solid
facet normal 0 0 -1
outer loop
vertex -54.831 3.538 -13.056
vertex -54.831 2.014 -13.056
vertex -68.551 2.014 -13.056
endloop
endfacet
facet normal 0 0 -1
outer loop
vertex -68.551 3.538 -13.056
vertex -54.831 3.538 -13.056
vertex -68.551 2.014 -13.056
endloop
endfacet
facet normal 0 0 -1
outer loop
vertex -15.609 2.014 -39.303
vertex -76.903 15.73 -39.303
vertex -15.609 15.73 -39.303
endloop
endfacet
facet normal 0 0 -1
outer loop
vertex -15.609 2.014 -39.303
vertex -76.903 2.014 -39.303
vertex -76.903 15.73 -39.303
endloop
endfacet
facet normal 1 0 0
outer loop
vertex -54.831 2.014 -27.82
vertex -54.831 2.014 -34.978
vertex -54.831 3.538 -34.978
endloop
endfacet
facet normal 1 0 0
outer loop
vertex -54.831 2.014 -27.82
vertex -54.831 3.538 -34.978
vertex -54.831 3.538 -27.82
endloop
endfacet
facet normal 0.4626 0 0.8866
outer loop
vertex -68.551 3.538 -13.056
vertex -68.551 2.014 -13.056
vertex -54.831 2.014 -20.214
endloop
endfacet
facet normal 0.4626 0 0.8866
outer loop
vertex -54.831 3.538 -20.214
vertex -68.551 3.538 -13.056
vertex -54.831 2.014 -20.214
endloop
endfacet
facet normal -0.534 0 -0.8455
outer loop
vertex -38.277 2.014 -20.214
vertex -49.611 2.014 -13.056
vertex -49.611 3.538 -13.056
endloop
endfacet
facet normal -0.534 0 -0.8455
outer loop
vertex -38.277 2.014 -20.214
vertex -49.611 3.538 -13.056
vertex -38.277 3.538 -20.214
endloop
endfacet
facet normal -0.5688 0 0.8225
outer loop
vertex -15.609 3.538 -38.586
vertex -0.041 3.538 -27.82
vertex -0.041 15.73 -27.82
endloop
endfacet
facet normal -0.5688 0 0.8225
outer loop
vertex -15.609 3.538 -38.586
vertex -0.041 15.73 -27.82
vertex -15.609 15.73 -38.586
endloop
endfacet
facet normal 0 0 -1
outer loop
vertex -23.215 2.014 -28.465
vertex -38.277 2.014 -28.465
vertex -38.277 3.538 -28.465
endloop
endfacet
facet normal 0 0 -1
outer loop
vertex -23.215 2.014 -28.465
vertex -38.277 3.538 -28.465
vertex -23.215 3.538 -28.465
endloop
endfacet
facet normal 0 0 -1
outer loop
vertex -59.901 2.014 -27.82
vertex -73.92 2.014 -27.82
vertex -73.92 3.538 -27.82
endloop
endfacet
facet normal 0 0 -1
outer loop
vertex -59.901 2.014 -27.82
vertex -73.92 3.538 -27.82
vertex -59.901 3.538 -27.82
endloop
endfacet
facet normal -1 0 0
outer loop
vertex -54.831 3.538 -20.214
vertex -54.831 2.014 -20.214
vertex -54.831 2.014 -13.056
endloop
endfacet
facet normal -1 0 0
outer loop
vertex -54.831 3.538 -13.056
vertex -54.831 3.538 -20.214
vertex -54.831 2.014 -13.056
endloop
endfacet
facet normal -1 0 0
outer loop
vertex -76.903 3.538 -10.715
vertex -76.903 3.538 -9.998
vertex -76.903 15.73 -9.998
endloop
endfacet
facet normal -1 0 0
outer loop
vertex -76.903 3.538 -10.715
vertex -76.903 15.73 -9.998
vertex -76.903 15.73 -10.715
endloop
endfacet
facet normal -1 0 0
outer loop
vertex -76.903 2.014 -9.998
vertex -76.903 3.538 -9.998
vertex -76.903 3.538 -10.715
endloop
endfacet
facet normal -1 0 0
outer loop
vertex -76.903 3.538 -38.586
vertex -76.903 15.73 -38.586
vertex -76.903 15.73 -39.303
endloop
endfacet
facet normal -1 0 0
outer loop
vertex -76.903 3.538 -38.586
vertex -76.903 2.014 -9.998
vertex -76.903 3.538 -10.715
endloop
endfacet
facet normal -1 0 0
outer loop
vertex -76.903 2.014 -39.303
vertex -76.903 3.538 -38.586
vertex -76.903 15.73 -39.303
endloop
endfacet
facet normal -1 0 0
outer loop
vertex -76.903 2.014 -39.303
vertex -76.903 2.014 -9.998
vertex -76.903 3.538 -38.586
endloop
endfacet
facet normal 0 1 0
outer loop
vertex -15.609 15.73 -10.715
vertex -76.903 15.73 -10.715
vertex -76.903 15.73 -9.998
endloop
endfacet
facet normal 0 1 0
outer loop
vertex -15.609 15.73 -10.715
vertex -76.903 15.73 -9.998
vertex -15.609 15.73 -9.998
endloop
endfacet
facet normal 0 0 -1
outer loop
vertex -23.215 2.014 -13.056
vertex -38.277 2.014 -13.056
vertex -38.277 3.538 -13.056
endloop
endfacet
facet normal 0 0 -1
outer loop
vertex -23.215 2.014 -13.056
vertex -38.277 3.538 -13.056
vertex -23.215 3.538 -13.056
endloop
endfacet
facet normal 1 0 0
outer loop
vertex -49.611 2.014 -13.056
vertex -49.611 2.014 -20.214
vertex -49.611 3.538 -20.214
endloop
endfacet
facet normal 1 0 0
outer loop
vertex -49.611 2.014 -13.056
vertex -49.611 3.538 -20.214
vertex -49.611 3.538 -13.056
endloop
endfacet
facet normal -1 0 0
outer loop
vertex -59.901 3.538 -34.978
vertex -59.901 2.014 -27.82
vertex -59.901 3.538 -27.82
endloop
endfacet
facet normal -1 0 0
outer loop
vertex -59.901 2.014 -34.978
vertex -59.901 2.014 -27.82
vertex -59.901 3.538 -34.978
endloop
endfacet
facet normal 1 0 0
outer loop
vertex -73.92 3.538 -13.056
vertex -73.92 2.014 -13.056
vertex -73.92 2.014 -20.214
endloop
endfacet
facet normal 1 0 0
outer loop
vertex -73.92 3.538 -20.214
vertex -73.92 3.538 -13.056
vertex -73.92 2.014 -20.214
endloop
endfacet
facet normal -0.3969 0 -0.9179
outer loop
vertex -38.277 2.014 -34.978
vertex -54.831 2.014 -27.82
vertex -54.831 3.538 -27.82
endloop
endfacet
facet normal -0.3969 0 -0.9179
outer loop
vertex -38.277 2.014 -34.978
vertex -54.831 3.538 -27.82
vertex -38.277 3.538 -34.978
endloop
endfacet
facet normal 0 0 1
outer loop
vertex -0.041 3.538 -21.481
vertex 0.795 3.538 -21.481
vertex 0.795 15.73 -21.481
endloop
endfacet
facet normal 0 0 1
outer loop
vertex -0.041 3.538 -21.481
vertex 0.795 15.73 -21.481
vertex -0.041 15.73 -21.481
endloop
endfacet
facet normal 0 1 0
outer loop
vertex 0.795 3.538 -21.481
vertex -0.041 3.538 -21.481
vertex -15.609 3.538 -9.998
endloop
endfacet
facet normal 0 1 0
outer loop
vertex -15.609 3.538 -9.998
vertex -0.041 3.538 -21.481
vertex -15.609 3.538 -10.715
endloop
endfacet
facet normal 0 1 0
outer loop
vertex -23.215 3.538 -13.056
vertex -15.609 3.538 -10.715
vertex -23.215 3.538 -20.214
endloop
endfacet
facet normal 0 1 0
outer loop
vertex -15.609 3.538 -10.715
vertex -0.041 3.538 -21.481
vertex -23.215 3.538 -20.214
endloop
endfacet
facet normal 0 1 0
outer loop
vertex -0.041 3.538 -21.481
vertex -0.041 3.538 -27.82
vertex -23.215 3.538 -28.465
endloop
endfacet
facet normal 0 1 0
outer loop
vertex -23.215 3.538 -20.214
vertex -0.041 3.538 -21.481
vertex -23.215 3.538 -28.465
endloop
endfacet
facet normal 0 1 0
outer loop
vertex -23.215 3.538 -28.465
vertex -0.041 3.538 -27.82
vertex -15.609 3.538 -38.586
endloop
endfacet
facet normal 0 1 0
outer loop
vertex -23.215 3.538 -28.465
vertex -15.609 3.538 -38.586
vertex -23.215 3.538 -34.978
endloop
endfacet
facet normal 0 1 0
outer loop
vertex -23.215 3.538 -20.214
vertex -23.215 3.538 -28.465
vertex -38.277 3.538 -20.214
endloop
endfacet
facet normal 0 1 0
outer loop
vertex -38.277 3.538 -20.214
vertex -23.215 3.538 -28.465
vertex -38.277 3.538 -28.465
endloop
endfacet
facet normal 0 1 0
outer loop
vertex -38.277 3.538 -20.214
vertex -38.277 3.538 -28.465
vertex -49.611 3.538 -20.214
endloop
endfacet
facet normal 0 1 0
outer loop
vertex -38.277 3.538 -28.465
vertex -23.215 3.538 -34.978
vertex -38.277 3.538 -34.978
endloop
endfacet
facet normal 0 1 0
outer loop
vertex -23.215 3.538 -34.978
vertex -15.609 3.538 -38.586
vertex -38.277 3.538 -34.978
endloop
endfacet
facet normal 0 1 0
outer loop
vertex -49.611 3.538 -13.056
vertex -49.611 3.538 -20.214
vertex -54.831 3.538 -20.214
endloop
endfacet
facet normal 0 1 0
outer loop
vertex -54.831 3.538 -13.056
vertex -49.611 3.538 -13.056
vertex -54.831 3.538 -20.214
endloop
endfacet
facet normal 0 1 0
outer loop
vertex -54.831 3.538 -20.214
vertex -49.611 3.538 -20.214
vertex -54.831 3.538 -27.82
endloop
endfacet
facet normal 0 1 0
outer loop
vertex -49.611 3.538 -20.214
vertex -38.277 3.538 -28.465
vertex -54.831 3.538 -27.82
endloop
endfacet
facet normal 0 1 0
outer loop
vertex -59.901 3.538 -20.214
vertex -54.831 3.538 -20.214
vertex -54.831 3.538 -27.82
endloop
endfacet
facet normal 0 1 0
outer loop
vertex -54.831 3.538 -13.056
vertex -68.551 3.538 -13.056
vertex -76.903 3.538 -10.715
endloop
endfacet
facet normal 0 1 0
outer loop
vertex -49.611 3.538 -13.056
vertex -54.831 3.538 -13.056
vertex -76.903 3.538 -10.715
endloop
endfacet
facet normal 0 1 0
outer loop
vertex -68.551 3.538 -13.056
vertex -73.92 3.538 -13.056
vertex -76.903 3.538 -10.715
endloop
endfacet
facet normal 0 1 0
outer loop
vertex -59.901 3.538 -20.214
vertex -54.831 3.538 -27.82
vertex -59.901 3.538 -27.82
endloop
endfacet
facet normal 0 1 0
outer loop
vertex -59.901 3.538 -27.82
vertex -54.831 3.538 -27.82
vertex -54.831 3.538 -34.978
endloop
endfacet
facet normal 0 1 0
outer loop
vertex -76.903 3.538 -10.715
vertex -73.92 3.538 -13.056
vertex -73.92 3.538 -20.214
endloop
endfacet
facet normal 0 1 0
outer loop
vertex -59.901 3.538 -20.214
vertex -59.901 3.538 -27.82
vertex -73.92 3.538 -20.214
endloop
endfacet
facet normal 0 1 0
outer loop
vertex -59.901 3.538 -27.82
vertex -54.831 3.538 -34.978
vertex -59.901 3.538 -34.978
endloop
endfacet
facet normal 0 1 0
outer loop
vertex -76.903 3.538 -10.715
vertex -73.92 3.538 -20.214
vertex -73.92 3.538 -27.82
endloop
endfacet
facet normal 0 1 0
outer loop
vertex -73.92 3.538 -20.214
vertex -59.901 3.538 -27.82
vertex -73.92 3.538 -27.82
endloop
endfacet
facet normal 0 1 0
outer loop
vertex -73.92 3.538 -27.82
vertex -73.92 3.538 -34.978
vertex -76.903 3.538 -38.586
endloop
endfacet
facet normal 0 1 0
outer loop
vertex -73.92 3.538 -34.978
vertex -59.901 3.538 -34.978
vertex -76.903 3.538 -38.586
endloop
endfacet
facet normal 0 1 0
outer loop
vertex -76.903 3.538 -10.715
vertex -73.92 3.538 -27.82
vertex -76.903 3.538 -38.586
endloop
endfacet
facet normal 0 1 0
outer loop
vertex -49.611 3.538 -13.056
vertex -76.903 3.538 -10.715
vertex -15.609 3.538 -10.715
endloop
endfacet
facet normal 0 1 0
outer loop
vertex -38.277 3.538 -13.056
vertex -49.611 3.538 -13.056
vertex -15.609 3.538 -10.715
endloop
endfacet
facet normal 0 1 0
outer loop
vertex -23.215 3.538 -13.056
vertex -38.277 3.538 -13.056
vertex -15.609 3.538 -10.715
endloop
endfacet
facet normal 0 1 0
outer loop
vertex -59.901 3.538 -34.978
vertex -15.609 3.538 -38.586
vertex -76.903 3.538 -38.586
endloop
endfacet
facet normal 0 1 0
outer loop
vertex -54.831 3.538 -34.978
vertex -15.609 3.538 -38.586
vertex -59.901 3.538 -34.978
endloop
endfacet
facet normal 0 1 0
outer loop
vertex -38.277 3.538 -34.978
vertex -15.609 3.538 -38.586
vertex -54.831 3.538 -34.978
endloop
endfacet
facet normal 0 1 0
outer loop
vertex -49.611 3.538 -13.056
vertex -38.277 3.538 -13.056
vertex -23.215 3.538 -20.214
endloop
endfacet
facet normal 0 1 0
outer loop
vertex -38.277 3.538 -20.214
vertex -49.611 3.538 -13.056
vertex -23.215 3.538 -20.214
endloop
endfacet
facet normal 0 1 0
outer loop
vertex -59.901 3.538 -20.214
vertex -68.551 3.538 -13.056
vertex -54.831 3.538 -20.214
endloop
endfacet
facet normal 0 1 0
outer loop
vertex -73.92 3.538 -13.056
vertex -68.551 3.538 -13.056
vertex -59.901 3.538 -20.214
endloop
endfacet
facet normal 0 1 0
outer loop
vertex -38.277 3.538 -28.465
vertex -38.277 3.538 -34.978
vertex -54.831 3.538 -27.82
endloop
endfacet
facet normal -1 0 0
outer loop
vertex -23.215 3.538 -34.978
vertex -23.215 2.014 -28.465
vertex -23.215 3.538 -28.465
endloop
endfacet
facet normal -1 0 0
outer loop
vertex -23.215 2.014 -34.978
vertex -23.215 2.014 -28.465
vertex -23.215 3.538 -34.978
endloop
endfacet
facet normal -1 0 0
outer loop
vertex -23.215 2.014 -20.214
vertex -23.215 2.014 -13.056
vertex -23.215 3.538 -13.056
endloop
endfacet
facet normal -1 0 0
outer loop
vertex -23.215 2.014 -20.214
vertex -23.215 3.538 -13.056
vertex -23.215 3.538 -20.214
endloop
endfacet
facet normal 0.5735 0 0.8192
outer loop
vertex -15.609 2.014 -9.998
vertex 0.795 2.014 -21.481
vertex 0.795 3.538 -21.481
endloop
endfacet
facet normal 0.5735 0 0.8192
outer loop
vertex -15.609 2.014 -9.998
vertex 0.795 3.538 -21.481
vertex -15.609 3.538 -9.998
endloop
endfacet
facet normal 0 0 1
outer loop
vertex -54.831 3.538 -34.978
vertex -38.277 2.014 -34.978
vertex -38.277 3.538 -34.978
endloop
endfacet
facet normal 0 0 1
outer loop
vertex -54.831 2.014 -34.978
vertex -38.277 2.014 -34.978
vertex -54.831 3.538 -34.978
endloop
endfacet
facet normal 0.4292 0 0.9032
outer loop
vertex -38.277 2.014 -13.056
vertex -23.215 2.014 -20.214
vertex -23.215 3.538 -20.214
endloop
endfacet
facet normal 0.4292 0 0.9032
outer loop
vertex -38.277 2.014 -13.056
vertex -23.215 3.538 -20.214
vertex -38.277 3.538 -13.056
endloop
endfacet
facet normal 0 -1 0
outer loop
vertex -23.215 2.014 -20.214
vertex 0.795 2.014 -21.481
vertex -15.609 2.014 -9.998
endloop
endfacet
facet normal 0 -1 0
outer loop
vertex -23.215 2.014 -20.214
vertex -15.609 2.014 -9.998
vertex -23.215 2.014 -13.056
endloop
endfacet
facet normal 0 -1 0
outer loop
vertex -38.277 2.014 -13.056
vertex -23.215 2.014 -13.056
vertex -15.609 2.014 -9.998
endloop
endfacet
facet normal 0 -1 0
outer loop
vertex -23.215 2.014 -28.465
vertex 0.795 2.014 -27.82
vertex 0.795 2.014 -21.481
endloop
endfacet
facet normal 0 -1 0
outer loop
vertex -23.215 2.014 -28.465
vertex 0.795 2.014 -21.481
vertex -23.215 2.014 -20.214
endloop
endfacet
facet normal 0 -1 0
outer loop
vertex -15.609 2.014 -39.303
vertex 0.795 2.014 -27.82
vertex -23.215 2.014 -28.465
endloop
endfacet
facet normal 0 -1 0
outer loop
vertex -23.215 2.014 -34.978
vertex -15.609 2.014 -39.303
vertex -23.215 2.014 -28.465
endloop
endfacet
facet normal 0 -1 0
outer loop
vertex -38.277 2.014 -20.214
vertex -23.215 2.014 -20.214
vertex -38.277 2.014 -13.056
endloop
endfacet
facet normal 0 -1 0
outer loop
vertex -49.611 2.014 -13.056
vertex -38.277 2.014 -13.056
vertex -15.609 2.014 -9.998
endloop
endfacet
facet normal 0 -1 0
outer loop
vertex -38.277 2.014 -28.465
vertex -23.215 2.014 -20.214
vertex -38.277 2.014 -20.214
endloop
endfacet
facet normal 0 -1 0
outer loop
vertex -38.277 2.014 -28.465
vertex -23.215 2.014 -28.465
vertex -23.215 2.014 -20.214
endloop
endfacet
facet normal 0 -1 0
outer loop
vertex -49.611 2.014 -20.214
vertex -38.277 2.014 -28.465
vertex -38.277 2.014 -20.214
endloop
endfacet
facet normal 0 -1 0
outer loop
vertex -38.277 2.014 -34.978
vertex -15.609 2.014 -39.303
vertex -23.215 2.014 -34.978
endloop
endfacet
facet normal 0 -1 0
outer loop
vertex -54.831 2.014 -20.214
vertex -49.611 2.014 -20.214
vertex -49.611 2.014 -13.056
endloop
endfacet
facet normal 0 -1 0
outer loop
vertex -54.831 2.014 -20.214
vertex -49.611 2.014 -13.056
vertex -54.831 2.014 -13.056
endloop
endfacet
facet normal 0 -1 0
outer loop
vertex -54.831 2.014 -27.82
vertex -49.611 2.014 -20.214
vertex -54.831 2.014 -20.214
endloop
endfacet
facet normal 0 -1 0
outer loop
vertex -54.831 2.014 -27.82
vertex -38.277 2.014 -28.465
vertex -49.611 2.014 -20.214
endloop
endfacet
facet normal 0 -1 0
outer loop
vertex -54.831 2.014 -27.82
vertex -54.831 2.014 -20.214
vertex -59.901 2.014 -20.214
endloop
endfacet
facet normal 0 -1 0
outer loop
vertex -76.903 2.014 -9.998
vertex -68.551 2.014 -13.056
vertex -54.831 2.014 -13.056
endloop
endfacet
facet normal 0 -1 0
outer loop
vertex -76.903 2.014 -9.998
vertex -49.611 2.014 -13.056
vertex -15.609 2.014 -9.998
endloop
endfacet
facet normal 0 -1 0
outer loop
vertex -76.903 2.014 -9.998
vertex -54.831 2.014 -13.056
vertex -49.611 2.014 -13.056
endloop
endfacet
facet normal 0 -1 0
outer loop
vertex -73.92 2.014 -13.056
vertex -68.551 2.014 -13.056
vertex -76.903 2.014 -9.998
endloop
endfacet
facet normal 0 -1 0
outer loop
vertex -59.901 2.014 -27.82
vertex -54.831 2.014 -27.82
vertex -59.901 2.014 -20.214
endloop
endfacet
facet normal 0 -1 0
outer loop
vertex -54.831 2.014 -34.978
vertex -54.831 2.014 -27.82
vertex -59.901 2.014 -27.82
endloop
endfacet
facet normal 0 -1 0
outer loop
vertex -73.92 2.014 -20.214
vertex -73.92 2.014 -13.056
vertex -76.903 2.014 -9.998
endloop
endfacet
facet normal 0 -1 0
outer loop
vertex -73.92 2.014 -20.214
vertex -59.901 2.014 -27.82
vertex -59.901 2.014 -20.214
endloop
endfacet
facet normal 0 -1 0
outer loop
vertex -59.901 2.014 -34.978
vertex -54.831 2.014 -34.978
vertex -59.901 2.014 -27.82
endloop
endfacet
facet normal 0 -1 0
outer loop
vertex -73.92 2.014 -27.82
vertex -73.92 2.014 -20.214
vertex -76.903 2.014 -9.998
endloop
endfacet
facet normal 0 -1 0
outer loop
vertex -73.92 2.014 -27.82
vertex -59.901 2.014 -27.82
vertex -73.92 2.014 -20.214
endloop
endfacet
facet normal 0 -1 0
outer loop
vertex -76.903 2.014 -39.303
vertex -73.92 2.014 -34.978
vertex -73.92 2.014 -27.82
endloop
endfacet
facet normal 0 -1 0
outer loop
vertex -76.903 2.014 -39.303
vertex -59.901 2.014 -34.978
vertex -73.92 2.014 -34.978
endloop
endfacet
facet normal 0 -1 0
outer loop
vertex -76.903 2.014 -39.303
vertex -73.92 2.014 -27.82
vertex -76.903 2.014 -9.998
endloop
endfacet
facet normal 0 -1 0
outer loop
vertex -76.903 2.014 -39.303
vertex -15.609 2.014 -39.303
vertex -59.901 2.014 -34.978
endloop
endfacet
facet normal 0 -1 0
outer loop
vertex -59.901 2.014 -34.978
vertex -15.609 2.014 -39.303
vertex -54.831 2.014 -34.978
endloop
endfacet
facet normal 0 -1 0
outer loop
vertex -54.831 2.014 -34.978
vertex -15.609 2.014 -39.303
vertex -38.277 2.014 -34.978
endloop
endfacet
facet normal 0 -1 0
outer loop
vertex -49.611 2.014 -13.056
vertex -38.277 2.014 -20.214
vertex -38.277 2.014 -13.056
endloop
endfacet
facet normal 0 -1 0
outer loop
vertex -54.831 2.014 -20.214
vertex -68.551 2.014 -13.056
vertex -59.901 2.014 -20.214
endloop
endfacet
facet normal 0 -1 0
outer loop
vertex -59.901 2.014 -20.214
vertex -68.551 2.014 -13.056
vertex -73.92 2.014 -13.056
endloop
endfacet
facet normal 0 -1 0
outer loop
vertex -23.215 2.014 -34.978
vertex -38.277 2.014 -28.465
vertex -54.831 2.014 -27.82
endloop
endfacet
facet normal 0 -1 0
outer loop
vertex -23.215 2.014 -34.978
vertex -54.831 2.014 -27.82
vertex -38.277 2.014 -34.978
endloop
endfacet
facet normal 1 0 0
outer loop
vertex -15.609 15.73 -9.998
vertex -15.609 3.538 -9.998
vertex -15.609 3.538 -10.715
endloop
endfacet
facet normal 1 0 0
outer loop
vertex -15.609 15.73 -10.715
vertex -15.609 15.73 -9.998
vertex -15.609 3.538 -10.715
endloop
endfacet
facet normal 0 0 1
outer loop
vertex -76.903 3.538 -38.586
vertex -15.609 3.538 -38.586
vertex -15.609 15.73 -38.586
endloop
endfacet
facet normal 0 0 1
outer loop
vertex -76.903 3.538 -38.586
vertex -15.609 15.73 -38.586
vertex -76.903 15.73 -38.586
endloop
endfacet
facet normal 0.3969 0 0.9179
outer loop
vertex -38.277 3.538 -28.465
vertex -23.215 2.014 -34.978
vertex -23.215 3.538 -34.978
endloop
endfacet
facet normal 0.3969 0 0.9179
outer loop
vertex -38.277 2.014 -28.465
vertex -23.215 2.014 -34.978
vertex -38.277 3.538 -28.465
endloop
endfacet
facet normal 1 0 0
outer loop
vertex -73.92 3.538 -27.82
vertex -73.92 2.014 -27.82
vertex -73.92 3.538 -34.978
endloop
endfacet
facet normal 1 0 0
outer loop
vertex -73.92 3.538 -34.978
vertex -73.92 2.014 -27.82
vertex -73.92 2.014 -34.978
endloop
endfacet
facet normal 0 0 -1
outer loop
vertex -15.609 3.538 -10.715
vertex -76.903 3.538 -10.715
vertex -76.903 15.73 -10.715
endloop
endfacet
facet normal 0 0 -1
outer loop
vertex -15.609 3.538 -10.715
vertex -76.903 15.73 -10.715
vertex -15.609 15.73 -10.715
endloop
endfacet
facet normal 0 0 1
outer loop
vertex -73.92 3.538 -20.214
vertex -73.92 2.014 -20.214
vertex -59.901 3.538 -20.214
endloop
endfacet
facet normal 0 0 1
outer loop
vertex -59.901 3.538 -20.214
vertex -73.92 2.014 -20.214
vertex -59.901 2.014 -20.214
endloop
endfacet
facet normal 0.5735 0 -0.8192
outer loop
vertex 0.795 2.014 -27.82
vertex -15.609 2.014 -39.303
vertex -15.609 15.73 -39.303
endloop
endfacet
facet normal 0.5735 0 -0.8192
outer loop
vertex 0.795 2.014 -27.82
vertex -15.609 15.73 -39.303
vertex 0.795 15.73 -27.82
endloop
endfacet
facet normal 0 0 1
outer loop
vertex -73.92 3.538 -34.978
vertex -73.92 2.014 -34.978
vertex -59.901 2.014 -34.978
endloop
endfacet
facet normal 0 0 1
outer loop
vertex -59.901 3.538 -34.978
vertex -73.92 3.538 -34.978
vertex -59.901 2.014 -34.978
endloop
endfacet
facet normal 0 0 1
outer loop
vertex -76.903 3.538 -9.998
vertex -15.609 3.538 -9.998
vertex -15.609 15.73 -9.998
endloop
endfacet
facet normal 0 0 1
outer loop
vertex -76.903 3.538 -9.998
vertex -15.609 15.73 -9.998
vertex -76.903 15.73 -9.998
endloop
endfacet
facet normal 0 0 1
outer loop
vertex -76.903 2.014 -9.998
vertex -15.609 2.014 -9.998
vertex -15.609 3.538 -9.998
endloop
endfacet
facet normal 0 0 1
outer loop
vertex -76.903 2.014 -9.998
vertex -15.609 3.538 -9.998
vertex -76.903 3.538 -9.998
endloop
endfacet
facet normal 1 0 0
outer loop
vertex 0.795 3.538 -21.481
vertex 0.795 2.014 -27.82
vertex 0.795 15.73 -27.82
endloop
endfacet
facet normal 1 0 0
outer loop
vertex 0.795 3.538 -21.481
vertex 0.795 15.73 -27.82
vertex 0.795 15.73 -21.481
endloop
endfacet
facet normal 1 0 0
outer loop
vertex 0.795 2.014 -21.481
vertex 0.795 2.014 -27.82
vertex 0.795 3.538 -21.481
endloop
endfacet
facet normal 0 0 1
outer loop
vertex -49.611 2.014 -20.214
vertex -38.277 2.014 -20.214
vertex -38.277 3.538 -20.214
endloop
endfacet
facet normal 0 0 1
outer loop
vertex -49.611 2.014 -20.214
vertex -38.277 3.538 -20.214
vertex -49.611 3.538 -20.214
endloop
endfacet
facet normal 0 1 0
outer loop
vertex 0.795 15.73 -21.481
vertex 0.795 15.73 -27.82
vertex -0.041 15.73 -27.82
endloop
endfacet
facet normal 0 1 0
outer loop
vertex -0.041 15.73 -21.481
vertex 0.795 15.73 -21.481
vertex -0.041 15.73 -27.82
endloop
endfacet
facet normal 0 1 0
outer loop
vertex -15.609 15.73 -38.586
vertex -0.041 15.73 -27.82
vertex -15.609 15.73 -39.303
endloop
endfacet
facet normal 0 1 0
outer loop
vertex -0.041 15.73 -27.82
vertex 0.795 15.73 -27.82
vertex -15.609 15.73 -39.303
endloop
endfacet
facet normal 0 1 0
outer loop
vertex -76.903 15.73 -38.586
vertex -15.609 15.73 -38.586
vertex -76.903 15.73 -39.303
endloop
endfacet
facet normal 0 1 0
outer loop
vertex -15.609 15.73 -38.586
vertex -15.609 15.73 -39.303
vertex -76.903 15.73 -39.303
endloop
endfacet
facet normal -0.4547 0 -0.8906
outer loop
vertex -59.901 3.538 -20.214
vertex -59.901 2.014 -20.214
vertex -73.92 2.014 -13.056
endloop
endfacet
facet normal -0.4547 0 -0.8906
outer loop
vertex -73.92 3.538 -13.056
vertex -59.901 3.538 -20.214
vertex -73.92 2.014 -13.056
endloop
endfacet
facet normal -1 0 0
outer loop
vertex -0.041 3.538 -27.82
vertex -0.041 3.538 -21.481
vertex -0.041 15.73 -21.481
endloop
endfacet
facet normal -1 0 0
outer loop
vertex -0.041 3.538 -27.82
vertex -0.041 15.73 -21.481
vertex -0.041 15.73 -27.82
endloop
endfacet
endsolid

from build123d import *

# Parameters (mm, degrees)
SKETCH2_W           = 23.364084101
SKETCH2_H           = 11.930596137
BOSS_EXTRUDE1_DEPTH = 2.54
SKETCH3_W           = 102.155729419
SKETCH3_H           = 1.194871536
BOSS_EXTRUDE3_DEPTH = 20.32
SCALE1_SCALE        = 0.6


with BuildPart() as part:
    # Sketch2 → Boss-Extrude1 (new body)
    with BuildSketch(Plane(origin=(0, 0, 0), x_dir=(1, 0, 0), z_dir=(0, 1, 0))):
        Polygon((0, 48.840877934), (27.34094948, 29.702213298), (27.34094948, 19.138664636), (0, 0), (-102.155729419, 0), (-102.155729419, 48.840877934), align=None)
        Polygon((-97.184647696, 5.095358767), (-97.184647696, 17.025954903), (-73.820563595, 17.025954903), align=None, mode=Mode.SUBTRACT)
        with Locations((-85.502605646, 35.667511367)):
            Rectangle(SKETCH2_W, SKETCH2_H, mode=Mode.SUBTRACT)
        Polygon((-65.369724665, 41.632809435), (-65.369724665, 29.702213298), (-37.780221099, 41.632809435), align=None, mode=Mode.SUBTRACT)
        Polygon((-12.676258395, 30.777041779), (-12.676258395, 41.632809435), (-37.780221099, 30.777041779), align=None, mode=Mode.SUBTRACT)
        Polygon((-65.369724665, 17.025954903), (-65.369724665, 5.095358767), (-88.236700593, 5.095358767), align=None, mode=Mode.SUBTRACT)
        Polygon((-56.670331649, 17.025954903), (-56.670331649, 5.095358767), (-37.780221099, 17.025954903), align=None, mode=Mode.SUBTRACT)
        Polygon((-37.780221099, 5.095358767), (-12.676258395, 5.095358767), (-12.676258395, 17.025954903), align=None, mode=Mode.SUBTRACT)
    extrude(amount=BOSS_EXTRUDE1_DEPTH)

    # Sketch3 → Boss-Extrude3 (add)
    with BuildSketch(Plane(origin=(0, 2.54, 0), x_dir=(1, 0, 0), z_dir=(0, 1, 0))):
        Polygon((-102.155729419, 48.840877934), (0, 48.840877934), (27.34094948, 29.702213298), (27.34094948, 19.138664636), (25.946282646, 19.138664636), (25.946282646, 29.702213298), (0, 47.646006398), (-102.155729419, 47.646006398), align=None)
        with Locations((-51.07786471, 0.597435768)):
            Rectangle(SKETCH3_W, SKETCH3_H)
    extrude(amount=BOSS_EXTRUDE3_DEPTH)


with BuildPart() as part_1:
    # Scale1: scaled about (-39.022733584, 5.036168927, -24.995733367)
    add(part.part.scale(SCALE1_SCALE).moved(Location((-15.609093434, 2.014467571, -9.998293347))))


solid = part_1.part
